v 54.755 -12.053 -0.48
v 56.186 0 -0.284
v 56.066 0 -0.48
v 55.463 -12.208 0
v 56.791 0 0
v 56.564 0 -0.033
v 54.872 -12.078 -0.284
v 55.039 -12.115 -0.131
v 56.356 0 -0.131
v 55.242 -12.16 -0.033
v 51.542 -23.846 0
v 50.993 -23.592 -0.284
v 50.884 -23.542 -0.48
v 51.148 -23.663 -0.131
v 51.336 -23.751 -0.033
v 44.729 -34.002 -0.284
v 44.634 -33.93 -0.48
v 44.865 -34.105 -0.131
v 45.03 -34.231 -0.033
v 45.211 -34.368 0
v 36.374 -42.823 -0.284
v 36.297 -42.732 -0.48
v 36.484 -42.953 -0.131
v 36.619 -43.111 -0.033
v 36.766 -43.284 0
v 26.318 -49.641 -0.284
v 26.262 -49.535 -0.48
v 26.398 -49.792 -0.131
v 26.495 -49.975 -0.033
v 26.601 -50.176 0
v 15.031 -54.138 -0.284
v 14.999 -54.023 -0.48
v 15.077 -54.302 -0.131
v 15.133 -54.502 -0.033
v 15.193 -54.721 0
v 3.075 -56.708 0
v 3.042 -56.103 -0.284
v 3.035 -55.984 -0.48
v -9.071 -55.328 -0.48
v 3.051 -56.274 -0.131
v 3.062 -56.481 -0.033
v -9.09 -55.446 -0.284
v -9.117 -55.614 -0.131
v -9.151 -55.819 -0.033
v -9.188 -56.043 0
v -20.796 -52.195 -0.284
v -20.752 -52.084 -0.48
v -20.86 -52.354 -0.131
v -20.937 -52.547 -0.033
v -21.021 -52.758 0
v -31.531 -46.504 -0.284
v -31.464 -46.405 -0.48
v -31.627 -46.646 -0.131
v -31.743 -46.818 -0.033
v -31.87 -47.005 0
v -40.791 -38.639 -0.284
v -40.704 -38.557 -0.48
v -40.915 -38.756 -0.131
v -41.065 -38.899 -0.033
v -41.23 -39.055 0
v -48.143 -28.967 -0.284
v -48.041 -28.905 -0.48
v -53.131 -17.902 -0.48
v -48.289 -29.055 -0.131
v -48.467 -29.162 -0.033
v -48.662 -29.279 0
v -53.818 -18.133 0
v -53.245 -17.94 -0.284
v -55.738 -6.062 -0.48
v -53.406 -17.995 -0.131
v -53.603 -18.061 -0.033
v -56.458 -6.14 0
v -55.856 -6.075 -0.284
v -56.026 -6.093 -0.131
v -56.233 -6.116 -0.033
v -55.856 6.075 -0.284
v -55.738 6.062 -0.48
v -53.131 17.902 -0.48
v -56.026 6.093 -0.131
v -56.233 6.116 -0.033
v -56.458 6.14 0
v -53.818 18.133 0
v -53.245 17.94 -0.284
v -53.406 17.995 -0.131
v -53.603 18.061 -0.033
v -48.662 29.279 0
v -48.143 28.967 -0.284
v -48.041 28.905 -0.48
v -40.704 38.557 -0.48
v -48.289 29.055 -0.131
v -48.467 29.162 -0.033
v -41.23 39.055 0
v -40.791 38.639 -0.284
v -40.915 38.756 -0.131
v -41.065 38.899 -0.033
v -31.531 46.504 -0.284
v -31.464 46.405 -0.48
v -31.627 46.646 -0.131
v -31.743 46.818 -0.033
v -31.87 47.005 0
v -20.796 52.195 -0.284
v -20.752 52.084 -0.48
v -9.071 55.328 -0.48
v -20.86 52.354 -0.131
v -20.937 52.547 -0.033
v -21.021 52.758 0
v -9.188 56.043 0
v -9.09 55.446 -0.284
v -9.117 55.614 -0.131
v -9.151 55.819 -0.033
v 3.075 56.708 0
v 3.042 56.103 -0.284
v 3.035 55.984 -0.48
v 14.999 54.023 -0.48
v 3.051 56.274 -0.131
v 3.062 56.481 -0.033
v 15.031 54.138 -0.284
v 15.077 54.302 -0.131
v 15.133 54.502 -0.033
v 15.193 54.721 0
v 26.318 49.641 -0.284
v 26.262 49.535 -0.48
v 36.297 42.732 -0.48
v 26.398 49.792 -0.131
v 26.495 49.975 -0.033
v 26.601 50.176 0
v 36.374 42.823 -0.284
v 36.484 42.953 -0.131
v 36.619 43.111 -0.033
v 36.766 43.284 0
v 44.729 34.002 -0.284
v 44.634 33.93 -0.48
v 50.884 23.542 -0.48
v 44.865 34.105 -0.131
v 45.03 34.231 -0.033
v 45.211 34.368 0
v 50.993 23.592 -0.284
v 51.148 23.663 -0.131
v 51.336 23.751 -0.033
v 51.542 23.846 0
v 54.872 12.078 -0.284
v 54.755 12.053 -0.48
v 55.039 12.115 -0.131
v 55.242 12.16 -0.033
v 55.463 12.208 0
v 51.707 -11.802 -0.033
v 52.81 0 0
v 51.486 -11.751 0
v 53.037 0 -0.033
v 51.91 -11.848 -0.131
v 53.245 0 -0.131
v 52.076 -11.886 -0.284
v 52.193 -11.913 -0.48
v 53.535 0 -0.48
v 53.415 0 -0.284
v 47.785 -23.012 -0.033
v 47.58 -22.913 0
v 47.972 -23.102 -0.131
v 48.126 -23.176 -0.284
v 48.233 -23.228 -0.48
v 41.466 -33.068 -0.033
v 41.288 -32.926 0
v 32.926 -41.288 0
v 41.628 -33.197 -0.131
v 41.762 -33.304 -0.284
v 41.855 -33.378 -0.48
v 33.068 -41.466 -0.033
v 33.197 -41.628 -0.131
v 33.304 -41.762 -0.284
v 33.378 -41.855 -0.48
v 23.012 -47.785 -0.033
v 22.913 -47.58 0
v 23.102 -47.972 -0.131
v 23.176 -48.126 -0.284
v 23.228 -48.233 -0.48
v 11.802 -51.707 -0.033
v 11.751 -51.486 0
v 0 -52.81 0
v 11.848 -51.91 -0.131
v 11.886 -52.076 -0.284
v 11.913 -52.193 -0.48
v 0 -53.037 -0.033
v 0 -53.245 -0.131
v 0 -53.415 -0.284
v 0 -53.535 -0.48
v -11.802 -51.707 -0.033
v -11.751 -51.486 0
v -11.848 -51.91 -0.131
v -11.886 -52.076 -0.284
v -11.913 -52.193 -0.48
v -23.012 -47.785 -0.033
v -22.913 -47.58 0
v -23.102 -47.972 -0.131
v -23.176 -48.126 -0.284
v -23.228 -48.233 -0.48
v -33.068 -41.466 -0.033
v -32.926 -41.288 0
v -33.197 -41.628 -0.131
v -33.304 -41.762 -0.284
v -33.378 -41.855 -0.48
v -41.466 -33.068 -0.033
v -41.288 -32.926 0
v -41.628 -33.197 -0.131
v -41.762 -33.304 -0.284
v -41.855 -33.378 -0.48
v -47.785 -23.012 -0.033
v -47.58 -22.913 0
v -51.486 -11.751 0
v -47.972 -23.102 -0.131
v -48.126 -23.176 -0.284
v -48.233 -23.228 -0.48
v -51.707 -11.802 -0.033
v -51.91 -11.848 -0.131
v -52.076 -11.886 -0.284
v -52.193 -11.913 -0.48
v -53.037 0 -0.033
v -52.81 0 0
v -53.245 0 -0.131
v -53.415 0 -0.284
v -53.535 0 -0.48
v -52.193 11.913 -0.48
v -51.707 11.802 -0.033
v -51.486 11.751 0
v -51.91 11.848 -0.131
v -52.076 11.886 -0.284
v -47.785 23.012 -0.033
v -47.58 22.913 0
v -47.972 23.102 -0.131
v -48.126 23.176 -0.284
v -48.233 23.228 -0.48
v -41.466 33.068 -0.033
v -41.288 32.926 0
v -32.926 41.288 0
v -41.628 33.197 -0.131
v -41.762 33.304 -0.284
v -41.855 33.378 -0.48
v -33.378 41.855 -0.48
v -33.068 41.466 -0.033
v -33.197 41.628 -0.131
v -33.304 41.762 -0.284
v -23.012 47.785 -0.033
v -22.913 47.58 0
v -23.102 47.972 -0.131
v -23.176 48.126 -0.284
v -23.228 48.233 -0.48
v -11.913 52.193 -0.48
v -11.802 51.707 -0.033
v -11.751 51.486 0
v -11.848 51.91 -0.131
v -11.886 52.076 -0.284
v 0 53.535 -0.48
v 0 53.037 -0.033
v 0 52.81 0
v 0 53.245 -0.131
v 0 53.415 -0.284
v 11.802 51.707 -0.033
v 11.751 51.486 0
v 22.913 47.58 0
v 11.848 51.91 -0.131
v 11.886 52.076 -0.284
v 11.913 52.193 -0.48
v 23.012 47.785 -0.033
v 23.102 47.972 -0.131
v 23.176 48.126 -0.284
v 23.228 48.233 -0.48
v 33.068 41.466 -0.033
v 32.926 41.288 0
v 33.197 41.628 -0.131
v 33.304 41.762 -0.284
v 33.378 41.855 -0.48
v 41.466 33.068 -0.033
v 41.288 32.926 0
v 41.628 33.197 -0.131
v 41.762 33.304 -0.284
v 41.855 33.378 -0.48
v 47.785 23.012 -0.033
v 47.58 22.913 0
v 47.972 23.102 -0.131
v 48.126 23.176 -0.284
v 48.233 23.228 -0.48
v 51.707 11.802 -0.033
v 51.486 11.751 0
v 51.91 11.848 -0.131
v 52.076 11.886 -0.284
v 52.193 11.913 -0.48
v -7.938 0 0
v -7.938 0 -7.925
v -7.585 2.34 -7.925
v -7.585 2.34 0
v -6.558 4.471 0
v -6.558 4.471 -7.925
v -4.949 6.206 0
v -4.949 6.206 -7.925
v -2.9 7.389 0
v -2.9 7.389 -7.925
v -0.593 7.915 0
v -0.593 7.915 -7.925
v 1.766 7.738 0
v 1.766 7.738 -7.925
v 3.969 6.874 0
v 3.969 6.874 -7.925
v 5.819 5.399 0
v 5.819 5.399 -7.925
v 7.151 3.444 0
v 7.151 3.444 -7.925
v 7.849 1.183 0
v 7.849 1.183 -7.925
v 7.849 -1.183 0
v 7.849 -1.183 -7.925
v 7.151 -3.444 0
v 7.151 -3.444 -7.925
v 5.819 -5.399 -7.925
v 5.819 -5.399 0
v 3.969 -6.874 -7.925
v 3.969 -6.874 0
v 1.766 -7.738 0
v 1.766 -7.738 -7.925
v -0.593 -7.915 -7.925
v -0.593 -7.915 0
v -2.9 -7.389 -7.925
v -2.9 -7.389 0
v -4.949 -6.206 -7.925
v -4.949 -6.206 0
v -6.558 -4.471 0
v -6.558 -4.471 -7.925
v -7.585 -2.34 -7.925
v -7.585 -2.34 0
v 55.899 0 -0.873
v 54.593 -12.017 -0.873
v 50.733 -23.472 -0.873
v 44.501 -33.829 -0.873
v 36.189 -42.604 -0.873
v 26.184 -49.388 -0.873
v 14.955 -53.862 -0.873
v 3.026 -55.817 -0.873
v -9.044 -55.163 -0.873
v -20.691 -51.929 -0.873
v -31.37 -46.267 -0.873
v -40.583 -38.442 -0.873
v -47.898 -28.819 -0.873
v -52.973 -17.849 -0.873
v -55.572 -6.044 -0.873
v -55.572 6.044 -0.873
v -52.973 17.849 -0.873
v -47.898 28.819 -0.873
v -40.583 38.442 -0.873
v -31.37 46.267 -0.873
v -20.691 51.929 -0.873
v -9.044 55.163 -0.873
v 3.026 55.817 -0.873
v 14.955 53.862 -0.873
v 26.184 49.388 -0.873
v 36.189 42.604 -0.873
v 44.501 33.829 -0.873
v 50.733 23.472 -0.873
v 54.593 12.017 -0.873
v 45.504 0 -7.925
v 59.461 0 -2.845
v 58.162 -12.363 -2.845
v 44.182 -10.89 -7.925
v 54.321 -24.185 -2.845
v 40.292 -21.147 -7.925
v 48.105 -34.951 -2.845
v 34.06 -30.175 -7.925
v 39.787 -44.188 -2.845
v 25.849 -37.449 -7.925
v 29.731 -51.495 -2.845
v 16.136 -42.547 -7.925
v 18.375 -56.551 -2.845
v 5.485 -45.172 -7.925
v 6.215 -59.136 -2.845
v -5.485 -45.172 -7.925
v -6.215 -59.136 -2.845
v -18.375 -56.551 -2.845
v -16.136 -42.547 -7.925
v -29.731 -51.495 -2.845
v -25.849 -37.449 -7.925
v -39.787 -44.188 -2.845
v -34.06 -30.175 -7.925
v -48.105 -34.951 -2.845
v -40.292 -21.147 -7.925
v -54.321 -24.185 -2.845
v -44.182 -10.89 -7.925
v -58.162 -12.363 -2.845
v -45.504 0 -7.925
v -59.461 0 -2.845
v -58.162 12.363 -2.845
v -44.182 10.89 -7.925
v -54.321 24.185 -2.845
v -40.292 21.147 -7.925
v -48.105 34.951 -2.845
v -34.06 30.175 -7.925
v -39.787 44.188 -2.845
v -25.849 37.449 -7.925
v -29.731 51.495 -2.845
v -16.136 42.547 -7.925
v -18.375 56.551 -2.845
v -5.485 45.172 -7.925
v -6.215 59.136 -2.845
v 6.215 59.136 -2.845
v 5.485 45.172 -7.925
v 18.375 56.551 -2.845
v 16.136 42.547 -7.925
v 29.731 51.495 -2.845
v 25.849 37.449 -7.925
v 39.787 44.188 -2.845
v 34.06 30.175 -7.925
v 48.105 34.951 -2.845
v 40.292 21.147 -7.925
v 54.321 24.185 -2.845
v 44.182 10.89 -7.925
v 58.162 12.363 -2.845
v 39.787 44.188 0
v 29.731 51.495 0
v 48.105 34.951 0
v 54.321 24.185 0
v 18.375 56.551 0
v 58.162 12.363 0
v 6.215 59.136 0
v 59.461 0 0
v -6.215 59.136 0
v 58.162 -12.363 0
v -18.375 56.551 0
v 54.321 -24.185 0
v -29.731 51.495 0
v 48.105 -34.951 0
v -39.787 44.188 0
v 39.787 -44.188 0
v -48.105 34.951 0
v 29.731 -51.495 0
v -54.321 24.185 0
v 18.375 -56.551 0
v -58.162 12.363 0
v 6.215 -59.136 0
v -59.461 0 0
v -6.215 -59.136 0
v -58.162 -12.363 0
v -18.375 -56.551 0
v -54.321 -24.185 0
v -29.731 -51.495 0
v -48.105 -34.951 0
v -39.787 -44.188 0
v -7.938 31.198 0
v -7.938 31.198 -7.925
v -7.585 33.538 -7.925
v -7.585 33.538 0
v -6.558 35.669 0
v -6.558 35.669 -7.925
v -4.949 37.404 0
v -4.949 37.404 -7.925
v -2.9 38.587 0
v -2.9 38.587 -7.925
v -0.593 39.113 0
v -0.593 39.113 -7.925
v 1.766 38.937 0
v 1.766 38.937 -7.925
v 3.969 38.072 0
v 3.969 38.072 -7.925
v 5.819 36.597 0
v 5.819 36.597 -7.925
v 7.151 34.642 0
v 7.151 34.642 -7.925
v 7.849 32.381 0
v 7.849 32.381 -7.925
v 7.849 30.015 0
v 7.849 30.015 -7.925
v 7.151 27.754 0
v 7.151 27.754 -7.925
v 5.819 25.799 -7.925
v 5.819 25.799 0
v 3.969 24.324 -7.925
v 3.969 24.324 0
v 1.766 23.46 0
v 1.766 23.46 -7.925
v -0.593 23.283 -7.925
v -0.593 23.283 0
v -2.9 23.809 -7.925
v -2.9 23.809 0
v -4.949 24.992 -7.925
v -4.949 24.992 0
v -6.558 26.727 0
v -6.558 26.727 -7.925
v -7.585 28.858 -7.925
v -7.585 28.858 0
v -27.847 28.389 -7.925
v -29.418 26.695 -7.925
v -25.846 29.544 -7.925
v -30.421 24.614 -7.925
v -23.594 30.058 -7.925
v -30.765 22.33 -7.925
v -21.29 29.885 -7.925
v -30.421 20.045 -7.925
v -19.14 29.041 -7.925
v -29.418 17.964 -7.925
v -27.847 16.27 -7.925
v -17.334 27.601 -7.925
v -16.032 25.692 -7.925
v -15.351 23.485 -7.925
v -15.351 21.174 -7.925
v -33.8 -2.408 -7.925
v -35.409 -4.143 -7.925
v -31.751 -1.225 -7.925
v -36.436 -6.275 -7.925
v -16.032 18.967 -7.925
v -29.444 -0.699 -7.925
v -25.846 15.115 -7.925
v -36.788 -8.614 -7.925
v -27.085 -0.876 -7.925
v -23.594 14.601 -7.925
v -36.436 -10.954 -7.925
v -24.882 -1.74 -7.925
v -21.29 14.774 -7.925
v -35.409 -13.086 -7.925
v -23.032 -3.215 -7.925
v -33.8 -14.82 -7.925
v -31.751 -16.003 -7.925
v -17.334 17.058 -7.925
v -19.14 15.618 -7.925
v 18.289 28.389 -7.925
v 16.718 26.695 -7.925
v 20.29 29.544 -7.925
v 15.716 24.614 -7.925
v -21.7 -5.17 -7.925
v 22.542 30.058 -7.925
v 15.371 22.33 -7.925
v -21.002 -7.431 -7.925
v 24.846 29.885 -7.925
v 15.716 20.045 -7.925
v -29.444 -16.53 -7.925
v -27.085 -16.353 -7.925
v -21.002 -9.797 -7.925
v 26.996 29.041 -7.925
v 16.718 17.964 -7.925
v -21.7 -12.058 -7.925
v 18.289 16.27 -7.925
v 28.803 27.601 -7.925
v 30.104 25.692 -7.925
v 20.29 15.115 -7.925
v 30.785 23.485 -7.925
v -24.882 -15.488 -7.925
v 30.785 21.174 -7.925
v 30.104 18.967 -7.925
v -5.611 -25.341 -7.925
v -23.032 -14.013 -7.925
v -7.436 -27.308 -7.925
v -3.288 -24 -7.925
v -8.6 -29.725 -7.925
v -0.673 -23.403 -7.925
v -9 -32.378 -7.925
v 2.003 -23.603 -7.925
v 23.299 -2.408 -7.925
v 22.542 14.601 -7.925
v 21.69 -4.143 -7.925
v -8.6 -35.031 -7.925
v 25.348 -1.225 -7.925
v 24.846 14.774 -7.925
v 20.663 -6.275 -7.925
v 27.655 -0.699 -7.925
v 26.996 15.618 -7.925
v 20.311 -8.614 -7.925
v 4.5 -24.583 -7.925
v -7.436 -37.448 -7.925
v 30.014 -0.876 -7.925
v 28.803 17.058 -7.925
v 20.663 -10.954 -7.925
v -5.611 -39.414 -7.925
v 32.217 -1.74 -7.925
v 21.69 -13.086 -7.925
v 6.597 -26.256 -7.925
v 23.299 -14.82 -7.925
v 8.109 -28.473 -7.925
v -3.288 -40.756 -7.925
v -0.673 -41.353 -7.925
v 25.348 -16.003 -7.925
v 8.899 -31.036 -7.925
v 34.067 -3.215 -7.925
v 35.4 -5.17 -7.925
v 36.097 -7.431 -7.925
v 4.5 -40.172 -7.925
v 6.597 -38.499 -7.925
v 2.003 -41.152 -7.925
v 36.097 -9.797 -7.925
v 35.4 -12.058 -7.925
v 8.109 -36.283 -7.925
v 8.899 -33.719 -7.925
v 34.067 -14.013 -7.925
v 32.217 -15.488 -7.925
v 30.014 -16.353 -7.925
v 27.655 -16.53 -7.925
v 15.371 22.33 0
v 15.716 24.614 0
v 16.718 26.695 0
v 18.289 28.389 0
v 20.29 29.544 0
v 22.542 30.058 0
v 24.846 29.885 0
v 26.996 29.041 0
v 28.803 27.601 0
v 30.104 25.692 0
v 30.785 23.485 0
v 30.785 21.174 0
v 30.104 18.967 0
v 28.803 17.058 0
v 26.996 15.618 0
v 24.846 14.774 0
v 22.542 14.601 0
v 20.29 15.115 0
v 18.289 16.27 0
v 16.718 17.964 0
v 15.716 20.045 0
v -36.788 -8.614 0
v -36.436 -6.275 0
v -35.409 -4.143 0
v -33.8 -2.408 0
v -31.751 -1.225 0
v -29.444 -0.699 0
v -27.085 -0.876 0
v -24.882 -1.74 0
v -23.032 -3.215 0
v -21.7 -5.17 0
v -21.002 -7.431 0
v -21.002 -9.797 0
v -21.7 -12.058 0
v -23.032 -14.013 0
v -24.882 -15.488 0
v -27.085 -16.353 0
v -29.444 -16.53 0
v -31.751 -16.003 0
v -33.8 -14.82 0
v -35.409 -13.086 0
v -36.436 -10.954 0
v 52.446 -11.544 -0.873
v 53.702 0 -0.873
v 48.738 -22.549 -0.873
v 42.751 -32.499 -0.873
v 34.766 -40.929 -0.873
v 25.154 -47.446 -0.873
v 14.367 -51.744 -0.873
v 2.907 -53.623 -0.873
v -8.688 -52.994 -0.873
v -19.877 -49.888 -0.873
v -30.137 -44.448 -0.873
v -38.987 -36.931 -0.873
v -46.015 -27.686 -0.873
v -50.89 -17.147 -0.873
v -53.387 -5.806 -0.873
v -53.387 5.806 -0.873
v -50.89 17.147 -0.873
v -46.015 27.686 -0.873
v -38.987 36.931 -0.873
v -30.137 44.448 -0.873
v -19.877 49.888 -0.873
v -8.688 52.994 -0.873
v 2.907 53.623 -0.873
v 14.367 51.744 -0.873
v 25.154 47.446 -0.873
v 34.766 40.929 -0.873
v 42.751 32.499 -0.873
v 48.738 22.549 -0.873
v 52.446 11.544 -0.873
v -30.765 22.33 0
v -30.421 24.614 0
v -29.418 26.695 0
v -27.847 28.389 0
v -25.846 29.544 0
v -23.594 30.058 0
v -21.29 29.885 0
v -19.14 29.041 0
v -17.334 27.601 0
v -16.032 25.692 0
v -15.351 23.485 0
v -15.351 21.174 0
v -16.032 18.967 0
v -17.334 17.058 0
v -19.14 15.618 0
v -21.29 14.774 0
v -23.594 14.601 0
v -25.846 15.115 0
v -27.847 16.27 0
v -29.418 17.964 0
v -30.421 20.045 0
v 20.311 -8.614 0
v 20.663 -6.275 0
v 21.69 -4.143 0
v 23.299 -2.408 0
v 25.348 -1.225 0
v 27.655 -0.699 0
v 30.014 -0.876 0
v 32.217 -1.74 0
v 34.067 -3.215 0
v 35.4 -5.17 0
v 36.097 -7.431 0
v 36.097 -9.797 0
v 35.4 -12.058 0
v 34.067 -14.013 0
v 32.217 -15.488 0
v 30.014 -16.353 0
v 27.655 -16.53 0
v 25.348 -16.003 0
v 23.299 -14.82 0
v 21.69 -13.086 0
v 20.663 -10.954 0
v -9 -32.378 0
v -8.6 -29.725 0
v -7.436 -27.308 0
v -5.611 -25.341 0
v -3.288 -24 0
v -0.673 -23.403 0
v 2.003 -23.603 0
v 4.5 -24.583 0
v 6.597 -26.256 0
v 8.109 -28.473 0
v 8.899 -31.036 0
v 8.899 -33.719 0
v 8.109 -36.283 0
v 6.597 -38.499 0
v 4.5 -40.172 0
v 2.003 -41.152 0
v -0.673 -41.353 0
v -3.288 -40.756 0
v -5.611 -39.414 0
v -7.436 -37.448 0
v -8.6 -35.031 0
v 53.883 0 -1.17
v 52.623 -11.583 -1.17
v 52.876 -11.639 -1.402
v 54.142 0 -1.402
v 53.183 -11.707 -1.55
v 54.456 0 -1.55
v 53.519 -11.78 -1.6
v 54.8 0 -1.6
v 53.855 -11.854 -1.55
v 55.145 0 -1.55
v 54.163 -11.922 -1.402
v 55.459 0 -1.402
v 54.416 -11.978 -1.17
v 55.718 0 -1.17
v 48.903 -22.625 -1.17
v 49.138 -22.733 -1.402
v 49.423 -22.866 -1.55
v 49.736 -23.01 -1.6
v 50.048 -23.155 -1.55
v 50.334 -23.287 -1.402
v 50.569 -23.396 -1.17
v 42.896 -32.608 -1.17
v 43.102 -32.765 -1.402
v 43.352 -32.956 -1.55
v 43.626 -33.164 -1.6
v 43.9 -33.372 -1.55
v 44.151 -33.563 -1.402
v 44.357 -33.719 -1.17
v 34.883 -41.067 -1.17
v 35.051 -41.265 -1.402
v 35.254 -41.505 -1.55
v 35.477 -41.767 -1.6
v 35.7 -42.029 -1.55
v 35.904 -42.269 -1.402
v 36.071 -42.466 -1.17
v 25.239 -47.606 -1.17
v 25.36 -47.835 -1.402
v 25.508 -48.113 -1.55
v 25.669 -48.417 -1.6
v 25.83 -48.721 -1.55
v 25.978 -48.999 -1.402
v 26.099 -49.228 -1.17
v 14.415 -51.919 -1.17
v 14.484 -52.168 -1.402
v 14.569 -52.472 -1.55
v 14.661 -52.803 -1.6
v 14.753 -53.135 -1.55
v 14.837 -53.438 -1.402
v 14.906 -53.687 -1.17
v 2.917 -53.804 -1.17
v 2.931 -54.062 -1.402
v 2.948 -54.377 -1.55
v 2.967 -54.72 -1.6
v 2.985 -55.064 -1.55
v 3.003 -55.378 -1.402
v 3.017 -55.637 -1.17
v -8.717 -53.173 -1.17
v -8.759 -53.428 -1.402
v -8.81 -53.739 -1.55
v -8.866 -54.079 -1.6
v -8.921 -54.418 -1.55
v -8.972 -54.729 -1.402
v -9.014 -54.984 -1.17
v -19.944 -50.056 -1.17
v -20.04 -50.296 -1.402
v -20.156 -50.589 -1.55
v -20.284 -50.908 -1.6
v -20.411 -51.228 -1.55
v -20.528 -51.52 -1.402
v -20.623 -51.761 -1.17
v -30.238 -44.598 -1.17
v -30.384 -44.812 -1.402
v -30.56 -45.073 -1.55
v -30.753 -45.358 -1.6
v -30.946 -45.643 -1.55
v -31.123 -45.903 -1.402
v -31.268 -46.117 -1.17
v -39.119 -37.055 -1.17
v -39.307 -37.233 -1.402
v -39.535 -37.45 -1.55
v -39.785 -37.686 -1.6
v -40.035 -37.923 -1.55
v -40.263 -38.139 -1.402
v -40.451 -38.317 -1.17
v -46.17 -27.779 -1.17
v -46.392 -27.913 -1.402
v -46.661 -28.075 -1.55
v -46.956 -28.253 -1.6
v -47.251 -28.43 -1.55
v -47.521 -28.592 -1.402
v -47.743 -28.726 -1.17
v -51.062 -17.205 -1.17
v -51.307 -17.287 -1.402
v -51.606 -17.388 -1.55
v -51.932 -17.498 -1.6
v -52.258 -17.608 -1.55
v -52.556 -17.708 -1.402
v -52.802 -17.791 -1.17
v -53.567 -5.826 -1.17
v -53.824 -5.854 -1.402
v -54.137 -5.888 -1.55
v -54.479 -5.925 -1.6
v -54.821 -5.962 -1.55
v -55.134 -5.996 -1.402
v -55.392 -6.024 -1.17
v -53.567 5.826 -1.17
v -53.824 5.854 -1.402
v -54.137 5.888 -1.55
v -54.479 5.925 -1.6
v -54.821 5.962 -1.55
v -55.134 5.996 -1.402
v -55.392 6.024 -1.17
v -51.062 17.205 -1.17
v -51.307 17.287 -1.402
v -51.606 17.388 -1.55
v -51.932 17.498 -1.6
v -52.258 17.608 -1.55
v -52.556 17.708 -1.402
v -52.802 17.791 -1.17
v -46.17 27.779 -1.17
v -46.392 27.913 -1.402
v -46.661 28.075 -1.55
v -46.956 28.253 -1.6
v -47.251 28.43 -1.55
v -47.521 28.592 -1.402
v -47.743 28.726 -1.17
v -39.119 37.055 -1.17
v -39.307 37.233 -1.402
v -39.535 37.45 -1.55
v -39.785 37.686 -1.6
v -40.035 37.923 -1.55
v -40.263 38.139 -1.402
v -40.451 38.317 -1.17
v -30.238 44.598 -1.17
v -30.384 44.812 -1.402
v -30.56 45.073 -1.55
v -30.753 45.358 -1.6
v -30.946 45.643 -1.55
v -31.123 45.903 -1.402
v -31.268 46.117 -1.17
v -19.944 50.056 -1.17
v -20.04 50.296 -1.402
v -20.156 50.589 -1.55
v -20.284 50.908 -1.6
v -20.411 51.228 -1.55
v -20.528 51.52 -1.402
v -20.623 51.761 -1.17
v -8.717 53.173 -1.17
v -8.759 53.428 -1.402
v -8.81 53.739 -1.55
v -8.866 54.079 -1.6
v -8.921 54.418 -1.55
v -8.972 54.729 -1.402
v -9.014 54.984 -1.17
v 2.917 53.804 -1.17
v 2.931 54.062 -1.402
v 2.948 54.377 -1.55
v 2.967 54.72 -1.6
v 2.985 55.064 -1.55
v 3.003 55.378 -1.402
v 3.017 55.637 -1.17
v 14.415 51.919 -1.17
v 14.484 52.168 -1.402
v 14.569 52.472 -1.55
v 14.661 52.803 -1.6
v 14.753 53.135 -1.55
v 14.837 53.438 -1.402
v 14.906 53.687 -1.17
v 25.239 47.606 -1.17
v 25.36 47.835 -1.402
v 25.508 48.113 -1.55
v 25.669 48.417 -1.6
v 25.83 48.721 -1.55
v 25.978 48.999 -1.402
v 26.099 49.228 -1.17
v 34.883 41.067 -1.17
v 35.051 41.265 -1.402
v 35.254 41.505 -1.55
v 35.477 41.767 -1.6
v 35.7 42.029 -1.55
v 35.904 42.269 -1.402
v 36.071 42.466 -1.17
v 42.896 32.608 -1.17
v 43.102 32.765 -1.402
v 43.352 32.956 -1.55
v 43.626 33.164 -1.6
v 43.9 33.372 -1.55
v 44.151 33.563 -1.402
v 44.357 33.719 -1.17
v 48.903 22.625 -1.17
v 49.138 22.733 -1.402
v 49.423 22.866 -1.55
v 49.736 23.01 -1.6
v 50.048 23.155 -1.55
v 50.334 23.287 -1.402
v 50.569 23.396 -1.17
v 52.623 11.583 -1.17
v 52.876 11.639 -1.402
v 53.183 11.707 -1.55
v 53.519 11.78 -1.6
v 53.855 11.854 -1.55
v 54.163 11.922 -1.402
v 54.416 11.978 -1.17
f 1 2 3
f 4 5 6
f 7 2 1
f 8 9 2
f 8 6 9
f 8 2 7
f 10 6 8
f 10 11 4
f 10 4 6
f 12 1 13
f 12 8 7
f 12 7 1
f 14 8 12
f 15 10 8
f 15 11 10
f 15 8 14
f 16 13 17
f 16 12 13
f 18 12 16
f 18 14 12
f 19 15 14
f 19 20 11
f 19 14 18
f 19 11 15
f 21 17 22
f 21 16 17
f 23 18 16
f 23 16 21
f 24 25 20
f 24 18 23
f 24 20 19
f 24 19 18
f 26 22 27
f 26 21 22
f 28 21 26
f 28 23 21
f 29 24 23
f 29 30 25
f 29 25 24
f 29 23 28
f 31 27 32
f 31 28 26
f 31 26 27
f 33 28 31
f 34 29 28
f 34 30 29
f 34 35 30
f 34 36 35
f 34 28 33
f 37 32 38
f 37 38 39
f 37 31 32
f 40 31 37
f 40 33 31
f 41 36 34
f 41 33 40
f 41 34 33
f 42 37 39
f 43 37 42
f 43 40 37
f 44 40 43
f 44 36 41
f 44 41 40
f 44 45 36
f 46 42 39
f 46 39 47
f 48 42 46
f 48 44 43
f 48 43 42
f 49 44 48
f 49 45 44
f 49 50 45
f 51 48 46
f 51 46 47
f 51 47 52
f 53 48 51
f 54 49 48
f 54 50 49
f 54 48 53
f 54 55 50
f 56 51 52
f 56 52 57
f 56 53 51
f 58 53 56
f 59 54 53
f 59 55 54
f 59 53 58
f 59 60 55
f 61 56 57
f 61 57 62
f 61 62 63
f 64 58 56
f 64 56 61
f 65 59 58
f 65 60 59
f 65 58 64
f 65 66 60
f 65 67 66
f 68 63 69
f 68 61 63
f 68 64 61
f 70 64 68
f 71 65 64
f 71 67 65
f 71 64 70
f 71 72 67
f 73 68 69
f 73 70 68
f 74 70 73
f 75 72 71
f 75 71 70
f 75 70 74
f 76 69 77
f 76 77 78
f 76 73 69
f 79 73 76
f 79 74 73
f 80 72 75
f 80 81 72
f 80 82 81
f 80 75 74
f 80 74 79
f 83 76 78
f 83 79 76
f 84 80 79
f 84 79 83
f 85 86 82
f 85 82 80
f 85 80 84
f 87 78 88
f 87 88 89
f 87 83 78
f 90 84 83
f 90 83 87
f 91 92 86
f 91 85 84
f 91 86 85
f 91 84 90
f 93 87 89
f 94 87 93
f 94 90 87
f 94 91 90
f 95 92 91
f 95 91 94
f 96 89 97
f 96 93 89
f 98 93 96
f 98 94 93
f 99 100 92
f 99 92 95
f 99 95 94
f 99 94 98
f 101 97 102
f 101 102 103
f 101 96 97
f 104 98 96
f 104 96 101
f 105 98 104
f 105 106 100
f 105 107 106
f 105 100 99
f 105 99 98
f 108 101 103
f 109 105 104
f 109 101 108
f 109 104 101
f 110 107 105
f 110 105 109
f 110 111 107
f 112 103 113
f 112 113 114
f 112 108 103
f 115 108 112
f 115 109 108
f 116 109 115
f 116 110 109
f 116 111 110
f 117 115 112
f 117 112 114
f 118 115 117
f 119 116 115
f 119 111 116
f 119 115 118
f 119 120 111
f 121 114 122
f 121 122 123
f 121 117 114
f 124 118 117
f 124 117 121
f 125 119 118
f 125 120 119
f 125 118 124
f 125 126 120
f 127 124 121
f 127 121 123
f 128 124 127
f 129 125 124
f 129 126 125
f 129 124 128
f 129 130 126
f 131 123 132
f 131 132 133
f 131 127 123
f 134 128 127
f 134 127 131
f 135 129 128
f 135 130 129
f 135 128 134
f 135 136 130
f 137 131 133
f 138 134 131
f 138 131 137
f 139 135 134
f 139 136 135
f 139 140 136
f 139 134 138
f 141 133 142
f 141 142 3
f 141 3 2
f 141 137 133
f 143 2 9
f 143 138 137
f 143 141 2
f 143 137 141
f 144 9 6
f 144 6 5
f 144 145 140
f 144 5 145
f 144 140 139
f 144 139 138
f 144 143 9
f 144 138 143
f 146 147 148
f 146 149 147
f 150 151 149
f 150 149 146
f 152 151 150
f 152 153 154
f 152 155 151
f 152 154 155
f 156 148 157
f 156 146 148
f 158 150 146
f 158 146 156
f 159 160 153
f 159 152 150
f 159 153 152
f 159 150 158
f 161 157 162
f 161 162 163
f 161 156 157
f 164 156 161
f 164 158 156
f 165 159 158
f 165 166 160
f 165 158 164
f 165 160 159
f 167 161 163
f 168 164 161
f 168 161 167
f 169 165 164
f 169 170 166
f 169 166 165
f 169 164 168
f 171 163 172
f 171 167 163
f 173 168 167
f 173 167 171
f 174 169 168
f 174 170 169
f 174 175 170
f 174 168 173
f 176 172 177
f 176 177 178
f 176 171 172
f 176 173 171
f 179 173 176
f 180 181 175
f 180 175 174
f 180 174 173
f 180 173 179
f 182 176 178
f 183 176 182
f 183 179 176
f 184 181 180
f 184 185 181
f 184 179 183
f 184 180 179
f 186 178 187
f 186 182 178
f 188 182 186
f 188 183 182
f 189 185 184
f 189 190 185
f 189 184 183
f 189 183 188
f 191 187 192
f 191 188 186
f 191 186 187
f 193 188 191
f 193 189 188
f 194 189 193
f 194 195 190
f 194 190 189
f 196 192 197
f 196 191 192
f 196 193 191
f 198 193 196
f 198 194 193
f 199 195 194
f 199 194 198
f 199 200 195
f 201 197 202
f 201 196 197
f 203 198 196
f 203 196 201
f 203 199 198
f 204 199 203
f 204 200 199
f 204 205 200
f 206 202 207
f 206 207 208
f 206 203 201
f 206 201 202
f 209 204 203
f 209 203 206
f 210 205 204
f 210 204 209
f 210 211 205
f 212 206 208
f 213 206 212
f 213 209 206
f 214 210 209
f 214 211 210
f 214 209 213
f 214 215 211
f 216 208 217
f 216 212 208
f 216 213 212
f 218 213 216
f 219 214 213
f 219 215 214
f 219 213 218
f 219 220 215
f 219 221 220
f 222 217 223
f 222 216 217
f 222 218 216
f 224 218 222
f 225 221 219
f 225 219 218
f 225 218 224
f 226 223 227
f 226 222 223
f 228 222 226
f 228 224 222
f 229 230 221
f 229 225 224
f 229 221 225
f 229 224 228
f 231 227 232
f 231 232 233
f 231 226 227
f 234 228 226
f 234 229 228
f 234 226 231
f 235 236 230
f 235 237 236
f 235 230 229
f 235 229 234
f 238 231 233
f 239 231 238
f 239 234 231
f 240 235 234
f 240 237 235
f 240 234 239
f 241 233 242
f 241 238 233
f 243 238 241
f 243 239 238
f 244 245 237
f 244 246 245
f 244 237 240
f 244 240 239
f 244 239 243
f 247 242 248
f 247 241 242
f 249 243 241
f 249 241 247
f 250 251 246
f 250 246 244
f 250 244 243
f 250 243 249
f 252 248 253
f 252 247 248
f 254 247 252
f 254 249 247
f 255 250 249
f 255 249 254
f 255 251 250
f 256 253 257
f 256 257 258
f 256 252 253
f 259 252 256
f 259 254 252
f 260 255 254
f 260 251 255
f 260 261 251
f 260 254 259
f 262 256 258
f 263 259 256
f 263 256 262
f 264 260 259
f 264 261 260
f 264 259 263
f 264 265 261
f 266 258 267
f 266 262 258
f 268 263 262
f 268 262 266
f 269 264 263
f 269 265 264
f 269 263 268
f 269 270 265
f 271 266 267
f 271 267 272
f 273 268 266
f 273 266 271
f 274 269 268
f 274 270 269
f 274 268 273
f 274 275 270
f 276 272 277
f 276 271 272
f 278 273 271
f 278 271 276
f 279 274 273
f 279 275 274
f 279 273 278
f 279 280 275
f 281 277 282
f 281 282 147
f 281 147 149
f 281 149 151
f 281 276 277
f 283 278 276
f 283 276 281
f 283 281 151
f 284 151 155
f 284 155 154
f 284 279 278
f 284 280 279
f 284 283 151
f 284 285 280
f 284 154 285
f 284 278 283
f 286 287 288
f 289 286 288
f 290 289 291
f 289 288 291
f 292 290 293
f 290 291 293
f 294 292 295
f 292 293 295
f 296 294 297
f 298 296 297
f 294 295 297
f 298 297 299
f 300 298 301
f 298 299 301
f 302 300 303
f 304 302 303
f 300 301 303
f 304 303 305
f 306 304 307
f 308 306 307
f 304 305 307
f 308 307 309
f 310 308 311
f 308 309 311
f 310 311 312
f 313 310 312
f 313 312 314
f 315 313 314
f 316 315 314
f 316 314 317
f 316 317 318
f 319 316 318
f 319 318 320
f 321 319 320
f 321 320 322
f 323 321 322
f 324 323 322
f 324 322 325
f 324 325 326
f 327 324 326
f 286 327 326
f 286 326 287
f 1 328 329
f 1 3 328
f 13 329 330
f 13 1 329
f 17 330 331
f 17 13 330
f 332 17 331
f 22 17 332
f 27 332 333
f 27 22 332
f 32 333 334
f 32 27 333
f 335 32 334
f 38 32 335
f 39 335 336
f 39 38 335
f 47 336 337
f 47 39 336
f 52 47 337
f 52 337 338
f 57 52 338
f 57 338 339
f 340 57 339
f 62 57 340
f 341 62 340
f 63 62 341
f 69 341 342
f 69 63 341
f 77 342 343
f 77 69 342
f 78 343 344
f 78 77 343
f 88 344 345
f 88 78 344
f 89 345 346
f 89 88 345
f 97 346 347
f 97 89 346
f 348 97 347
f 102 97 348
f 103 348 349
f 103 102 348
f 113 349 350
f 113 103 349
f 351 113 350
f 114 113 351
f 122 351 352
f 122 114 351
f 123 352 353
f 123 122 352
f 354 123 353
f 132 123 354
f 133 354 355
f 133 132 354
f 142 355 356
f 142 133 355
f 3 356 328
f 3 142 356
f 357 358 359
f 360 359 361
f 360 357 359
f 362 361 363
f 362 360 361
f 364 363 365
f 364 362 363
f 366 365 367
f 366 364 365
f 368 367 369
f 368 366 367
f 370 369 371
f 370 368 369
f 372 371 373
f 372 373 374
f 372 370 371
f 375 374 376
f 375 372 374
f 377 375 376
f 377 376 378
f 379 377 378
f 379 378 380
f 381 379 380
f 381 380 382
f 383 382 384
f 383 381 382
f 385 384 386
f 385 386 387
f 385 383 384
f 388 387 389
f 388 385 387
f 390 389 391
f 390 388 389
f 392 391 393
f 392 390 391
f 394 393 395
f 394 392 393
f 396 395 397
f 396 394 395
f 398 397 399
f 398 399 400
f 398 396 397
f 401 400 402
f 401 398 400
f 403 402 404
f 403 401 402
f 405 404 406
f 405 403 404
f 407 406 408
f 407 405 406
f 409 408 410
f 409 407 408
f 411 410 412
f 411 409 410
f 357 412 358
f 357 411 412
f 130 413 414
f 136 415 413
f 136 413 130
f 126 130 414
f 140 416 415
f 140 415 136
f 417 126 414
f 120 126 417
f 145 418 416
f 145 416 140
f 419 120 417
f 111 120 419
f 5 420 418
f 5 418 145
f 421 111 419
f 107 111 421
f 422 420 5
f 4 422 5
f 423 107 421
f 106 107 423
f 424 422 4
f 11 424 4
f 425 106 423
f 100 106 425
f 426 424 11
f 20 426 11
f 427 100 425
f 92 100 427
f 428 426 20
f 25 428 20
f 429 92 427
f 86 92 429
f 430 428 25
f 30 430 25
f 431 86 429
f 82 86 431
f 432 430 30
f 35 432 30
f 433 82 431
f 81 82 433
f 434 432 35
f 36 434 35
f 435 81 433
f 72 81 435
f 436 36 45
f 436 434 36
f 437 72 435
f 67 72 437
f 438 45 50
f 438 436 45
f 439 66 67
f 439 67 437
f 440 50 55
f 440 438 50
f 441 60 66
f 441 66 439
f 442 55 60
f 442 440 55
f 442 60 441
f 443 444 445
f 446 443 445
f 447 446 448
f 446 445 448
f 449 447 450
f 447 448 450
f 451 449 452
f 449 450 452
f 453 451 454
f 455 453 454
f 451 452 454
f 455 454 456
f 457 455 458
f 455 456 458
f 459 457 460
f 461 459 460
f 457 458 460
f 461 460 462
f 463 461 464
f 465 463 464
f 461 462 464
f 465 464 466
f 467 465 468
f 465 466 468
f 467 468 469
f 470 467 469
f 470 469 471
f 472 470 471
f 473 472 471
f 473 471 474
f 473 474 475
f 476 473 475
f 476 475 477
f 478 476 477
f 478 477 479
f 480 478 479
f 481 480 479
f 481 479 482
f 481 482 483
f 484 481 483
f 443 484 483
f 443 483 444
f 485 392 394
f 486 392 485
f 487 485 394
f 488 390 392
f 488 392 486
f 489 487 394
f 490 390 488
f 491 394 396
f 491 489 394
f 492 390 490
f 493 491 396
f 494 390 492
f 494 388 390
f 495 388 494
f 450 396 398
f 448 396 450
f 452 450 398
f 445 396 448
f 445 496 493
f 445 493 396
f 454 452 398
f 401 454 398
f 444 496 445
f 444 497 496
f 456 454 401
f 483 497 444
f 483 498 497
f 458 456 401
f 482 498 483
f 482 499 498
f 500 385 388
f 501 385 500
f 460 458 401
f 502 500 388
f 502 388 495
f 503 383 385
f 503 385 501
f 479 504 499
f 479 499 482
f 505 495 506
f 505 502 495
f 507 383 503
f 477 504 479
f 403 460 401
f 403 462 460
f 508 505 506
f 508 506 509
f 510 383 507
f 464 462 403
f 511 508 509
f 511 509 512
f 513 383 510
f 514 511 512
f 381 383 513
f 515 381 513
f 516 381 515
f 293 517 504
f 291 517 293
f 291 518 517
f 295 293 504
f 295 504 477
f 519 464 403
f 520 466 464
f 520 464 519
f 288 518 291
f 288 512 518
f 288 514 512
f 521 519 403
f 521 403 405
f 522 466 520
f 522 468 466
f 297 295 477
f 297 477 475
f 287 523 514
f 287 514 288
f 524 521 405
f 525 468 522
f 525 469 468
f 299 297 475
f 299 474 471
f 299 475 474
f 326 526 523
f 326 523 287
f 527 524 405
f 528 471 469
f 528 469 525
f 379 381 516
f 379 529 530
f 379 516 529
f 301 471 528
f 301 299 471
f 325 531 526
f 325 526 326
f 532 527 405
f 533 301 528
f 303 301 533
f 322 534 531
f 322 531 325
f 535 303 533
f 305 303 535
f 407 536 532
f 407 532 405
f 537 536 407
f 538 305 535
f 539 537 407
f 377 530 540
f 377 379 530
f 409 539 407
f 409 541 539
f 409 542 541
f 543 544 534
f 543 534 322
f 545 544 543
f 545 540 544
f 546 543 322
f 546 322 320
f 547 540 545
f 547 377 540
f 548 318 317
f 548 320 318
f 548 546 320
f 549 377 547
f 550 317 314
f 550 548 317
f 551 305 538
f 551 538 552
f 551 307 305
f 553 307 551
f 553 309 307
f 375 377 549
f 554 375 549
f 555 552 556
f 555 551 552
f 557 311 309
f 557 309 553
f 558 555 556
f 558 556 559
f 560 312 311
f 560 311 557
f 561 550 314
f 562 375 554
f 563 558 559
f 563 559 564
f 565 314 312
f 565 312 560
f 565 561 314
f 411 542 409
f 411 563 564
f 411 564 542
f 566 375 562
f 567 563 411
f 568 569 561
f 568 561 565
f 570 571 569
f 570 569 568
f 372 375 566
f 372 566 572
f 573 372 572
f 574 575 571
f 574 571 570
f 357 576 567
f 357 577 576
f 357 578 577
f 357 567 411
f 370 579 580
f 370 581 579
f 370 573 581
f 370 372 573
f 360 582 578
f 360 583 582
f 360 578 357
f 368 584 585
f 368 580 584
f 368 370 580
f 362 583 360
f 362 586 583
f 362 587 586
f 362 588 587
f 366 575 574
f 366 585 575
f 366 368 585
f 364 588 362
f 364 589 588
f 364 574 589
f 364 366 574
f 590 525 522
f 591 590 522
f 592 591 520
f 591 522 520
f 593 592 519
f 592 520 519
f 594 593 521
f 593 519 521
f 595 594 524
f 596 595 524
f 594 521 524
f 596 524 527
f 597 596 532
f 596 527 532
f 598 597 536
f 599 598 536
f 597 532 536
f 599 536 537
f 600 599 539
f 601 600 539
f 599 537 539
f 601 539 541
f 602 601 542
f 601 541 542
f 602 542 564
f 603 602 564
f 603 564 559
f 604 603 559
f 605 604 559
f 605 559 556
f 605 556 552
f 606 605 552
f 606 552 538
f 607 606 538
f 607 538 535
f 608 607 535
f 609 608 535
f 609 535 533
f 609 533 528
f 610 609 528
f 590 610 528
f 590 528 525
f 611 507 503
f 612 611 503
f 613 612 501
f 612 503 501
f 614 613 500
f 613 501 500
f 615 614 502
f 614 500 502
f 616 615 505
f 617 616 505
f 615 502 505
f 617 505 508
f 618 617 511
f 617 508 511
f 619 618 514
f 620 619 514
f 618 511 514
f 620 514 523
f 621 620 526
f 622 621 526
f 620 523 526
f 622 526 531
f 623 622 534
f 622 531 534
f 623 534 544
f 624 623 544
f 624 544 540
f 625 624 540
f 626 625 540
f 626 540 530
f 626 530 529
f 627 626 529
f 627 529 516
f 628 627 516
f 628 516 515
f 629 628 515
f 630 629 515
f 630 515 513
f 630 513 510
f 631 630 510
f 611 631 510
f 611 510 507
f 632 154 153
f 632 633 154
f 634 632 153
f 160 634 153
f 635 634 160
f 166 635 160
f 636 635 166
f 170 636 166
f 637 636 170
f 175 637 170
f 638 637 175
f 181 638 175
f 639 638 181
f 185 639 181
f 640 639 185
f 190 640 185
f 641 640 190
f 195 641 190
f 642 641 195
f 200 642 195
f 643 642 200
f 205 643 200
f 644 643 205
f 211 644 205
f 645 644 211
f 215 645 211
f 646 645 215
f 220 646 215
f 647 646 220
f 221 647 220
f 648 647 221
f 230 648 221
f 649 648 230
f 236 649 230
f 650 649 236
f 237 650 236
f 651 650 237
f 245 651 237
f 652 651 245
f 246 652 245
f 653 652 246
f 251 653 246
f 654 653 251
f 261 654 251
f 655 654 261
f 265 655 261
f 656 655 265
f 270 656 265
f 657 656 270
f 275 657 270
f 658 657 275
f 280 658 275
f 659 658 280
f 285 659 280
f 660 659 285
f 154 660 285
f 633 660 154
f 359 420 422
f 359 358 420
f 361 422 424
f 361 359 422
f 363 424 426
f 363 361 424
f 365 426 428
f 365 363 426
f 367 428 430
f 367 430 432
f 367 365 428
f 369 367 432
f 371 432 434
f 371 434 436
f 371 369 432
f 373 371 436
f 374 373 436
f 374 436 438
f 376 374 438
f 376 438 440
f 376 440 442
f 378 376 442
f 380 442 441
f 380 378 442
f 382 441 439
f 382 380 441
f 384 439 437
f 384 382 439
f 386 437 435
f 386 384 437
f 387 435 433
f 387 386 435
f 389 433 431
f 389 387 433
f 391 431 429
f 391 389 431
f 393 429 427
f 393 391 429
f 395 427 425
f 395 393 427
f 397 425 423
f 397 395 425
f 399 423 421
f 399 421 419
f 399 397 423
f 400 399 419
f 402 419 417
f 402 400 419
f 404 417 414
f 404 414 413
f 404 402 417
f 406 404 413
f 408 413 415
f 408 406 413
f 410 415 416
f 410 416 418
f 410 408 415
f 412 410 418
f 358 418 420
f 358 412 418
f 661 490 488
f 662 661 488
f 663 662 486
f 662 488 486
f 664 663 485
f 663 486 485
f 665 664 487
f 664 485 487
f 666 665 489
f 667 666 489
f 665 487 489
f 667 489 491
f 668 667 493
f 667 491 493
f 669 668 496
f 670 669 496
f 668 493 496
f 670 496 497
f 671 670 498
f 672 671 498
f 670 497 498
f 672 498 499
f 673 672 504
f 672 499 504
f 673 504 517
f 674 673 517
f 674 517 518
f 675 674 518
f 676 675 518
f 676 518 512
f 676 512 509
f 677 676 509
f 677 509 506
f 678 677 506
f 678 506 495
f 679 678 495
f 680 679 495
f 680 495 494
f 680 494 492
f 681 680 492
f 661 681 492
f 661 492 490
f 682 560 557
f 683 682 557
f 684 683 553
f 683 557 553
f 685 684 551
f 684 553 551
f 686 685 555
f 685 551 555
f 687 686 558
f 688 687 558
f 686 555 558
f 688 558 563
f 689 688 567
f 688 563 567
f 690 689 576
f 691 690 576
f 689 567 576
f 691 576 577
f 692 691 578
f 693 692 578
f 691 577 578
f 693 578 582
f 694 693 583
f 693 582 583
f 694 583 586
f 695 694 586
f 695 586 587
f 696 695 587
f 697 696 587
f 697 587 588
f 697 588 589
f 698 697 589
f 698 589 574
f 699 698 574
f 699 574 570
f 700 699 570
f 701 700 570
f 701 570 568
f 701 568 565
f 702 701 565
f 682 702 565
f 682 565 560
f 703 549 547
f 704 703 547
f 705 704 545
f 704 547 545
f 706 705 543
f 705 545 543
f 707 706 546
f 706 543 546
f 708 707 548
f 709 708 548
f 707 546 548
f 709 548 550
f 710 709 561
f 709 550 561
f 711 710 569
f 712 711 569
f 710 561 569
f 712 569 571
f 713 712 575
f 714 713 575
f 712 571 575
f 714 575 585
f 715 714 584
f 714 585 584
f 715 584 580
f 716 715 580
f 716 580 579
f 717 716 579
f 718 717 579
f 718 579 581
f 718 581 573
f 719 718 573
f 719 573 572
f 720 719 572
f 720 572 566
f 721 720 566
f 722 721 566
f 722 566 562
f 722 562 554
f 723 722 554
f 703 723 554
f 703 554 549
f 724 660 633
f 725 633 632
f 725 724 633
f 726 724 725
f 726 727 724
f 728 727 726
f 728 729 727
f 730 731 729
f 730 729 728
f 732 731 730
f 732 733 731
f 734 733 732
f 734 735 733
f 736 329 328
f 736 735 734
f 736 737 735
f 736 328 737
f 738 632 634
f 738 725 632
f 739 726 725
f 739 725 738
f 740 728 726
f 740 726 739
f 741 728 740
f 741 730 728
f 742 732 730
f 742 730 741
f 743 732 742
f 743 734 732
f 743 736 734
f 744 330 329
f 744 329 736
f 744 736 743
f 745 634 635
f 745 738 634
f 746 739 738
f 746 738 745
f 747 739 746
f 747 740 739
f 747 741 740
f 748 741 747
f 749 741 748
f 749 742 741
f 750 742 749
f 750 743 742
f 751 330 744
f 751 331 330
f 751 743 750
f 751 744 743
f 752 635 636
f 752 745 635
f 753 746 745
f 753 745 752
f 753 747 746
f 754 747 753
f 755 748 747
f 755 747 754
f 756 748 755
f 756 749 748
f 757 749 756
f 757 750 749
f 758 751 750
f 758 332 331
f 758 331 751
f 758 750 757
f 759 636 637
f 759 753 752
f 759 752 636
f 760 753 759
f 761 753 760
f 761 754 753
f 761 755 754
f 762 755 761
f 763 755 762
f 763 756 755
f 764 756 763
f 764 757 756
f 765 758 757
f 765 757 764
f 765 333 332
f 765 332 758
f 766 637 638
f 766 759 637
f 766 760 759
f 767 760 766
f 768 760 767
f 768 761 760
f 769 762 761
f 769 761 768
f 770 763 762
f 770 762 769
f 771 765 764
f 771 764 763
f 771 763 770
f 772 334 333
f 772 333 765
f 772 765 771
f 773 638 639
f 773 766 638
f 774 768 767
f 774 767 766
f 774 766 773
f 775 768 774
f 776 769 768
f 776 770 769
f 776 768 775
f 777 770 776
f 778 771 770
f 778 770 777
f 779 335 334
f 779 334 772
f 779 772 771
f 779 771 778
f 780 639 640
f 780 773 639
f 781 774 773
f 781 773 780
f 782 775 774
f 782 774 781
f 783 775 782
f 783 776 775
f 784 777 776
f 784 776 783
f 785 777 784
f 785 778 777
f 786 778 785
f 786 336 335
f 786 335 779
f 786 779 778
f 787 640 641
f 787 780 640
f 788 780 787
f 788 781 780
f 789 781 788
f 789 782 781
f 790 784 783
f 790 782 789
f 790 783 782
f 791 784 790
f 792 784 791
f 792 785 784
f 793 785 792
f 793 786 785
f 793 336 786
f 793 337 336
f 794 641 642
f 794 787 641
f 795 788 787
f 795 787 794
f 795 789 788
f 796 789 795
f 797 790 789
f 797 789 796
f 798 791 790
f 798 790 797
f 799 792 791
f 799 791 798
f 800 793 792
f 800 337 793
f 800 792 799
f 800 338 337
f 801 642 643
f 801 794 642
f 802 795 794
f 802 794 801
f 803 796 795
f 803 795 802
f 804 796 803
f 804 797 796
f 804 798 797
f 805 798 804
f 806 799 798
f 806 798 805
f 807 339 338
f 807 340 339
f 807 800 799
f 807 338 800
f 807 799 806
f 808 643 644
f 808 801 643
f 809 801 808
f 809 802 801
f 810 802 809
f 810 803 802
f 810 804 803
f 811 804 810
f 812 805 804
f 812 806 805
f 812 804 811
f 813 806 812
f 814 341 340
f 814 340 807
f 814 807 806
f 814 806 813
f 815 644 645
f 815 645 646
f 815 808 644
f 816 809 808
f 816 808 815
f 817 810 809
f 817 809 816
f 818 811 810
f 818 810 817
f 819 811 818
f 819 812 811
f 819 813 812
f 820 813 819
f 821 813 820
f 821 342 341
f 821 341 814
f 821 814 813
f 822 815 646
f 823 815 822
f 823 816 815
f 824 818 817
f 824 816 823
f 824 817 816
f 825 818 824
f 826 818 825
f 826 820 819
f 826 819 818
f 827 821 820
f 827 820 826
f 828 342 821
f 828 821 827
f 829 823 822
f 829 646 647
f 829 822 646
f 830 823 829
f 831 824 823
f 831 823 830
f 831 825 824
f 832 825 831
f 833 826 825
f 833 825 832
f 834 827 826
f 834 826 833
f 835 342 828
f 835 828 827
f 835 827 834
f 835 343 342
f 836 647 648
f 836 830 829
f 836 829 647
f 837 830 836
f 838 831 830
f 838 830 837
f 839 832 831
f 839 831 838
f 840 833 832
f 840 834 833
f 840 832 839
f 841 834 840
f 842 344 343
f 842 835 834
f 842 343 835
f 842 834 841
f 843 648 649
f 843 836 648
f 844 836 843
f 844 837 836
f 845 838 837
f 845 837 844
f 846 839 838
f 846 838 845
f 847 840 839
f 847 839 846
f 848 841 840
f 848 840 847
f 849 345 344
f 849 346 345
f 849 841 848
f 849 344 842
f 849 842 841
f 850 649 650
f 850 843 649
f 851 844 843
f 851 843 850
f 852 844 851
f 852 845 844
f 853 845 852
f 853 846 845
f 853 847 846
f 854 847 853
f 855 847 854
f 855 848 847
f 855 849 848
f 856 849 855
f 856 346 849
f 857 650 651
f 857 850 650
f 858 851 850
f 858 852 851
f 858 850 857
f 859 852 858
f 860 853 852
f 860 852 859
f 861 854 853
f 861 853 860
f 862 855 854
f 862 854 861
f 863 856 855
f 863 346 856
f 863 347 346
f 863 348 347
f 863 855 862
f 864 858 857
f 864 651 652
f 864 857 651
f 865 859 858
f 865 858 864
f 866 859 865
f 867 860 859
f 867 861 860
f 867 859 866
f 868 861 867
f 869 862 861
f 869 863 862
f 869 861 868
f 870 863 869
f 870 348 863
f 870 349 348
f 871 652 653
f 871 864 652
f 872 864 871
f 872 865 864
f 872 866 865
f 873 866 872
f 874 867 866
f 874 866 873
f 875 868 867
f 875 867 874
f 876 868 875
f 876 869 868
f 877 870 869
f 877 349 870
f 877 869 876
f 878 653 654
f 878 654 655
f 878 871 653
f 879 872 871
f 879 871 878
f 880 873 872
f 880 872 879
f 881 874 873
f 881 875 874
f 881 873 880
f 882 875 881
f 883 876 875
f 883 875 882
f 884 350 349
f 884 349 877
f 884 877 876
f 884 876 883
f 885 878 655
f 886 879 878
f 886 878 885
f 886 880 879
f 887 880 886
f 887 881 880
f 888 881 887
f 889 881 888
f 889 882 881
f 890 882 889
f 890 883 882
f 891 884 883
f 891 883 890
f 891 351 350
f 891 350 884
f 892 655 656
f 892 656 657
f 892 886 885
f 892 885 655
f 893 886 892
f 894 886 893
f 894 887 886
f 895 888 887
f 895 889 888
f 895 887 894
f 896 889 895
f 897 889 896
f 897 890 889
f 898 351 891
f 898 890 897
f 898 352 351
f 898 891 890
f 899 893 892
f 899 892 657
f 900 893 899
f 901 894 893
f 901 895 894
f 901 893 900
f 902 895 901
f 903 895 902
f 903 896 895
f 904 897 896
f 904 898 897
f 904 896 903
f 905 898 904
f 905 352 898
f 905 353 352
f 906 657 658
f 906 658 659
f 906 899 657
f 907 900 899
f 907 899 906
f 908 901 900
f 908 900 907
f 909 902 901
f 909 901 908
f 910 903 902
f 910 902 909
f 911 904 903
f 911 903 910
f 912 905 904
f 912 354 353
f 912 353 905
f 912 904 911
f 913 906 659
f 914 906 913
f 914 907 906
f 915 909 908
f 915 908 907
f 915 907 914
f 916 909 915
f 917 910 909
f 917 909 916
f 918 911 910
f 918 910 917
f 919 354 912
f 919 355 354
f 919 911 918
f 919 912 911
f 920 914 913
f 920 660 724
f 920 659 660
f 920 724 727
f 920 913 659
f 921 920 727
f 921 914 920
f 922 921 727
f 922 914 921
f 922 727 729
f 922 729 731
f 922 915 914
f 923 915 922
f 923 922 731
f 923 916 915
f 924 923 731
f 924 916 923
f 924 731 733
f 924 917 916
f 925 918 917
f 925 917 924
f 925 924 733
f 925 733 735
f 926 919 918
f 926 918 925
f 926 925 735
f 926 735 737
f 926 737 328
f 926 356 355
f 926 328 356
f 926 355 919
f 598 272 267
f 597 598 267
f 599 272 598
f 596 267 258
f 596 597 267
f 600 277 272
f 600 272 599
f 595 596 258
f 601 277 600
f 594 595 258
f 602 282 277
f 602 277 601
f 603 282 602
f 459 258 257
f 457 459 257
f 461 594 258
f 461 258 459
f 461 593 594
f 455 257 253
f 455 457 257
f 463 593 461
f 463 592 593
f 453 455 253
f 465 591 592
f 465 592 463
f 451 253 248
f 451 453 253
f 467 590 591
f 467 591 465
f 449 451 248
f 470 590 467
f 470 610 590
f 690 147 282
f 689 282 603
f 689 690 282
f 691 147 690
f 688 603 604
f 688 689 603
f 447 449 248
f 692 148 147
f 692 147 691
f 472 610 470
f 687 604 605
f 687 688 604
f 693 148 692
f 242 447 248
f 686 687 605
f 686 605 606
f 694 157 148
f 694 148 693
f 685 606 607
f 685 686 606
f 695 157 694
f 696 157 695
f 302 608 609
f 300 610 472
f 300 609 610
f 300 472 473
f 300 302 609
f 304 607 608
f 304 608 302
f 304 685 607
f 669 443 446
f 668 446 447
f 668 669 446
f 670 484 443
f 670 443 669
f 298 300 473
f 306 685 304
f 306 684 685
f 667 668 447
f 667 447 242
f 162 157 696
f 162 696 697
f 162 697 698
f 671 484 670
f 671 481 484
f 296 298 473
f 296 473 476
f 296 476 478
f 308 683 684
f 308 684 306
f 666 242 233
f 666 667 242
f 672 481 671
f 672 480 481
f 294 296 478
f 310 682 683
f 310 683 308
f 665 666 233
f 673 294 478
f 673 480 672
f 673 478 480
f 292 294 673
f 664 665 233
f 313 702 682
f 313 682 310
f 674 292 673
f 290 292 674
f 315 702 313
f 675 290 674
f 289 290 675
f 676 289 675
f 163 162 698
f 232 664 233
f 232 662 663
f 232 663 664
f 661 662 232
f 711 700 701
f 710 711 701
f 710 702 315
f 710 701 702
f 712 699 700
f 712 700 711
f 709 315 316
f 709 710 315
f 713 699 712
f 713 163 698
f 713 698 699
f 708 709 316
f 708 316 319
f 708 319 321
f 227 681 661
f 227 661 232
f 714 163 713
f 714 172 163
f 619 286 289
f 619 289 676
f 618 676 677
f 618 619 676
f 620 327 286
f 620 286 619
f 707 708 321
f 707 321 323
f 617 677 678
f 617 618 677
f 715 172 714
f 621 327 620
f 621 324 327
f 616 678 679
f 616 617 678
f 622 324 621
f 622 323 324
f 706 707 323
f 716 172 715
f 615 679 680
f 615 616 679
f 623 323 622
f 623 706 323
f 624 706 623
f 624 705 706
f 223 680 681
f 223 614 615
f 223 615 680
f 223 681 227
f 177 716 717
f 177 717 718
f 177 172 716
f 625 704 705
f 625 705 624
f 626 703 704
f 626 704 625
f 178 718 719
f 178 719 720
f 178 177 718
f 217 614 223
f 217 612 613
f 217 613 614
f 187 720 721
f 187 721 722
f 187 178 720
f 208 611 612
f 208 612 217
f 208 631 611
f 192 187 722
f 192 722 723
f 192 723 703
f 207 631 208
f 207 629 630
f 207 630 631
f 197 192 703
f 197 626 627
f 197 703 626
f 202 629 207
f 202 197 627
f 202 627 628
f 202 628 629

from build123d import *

# Parameters (mm, degrees)
SKETCH2_R          = 7.75
SKETCH2_R_2        = 7.9375
SKETCH2_R_3        = 9
CUT_EXTRUDE1_DEPTH = 85.463711951


with BuildPart() as part:
    # Sketch1 → Revolve1 (revolve)
    with BuildSketch(Plane(origin=(0, 0, 0), x_dir=(0, 0, -1), z_dir=(1, 0, 0)), mode=Mode.PRIVATE) as revolve1_sk:
        with BuildLine():
            Line((0, 0), (0, 52.809927725))
            ThreePointArc((0, 52.809927725), (0.130798304, 53.244522907), (0.479738309, 53.534733247))
            Line((0.479738309, 53.534733247), (0.872854821, 53.701601306))
            ThreePointArc((0.872854821, 53.701601306), (1.6002, 54.8005), (0.872854821, 55.899398694))
            Line((0.872854821, 55.899398694), (0.479738309, 56.066266753))
            ThreePointArc((0.479738309, 56.066266753), (0.130798304, 56.356477093), (0, 56.791072275))
            Line((0, 56.791072275), (0, 59.4614))
            Line((0, 59.4614), (2.8448, 59.4614))
            Line((2.8448, 59.4614), (7.9248, 45.504214709))
            Line((7.9248, 45.504214709), (7.9248, 0))
            Line((7.9248, 0), (0, 0))
        make_face()
    revolve(revolve1_sk.sketch.rotate(Axis((0, 0, 0), (0, 0, -1)), 90), axis=Axis((0, 0, 0), (0, 0, -1)))

    # Sketch2 → Cut-Extrude1 (cut, through all)
    with BuildSketch(Plane(origin=(0, 0, -7.9248), x_dir=(-1, 0, 0), z_dir=(0, 0, -1))):
        with Locations((-23.121403313, 22.329574432)):
            Circle(SKETCH2_R)
        with Locations((23.014902328, 22.329574432)):
            Circle(SKETCH2_R)
        with Locations((0, 31.198057894)):
            Circle(SKETCH2_R_2)
        Circle(SKETCH2_R_2)
        with Locations((-28.2480994, -8.614227209)):
            Circle(SKETCH2_R_2)
        with Locations((0, -32.377727799)):
            Circle(SKETCH2_R_3)
        with Locations((28.850997909, -8.614227209)):
            Circle(SKETCH2_R_2)
    extrude(amount=-CUT_EXTRUDE1_DEPTH, mode=Mode.SUBTRACT)


solid = part.part
